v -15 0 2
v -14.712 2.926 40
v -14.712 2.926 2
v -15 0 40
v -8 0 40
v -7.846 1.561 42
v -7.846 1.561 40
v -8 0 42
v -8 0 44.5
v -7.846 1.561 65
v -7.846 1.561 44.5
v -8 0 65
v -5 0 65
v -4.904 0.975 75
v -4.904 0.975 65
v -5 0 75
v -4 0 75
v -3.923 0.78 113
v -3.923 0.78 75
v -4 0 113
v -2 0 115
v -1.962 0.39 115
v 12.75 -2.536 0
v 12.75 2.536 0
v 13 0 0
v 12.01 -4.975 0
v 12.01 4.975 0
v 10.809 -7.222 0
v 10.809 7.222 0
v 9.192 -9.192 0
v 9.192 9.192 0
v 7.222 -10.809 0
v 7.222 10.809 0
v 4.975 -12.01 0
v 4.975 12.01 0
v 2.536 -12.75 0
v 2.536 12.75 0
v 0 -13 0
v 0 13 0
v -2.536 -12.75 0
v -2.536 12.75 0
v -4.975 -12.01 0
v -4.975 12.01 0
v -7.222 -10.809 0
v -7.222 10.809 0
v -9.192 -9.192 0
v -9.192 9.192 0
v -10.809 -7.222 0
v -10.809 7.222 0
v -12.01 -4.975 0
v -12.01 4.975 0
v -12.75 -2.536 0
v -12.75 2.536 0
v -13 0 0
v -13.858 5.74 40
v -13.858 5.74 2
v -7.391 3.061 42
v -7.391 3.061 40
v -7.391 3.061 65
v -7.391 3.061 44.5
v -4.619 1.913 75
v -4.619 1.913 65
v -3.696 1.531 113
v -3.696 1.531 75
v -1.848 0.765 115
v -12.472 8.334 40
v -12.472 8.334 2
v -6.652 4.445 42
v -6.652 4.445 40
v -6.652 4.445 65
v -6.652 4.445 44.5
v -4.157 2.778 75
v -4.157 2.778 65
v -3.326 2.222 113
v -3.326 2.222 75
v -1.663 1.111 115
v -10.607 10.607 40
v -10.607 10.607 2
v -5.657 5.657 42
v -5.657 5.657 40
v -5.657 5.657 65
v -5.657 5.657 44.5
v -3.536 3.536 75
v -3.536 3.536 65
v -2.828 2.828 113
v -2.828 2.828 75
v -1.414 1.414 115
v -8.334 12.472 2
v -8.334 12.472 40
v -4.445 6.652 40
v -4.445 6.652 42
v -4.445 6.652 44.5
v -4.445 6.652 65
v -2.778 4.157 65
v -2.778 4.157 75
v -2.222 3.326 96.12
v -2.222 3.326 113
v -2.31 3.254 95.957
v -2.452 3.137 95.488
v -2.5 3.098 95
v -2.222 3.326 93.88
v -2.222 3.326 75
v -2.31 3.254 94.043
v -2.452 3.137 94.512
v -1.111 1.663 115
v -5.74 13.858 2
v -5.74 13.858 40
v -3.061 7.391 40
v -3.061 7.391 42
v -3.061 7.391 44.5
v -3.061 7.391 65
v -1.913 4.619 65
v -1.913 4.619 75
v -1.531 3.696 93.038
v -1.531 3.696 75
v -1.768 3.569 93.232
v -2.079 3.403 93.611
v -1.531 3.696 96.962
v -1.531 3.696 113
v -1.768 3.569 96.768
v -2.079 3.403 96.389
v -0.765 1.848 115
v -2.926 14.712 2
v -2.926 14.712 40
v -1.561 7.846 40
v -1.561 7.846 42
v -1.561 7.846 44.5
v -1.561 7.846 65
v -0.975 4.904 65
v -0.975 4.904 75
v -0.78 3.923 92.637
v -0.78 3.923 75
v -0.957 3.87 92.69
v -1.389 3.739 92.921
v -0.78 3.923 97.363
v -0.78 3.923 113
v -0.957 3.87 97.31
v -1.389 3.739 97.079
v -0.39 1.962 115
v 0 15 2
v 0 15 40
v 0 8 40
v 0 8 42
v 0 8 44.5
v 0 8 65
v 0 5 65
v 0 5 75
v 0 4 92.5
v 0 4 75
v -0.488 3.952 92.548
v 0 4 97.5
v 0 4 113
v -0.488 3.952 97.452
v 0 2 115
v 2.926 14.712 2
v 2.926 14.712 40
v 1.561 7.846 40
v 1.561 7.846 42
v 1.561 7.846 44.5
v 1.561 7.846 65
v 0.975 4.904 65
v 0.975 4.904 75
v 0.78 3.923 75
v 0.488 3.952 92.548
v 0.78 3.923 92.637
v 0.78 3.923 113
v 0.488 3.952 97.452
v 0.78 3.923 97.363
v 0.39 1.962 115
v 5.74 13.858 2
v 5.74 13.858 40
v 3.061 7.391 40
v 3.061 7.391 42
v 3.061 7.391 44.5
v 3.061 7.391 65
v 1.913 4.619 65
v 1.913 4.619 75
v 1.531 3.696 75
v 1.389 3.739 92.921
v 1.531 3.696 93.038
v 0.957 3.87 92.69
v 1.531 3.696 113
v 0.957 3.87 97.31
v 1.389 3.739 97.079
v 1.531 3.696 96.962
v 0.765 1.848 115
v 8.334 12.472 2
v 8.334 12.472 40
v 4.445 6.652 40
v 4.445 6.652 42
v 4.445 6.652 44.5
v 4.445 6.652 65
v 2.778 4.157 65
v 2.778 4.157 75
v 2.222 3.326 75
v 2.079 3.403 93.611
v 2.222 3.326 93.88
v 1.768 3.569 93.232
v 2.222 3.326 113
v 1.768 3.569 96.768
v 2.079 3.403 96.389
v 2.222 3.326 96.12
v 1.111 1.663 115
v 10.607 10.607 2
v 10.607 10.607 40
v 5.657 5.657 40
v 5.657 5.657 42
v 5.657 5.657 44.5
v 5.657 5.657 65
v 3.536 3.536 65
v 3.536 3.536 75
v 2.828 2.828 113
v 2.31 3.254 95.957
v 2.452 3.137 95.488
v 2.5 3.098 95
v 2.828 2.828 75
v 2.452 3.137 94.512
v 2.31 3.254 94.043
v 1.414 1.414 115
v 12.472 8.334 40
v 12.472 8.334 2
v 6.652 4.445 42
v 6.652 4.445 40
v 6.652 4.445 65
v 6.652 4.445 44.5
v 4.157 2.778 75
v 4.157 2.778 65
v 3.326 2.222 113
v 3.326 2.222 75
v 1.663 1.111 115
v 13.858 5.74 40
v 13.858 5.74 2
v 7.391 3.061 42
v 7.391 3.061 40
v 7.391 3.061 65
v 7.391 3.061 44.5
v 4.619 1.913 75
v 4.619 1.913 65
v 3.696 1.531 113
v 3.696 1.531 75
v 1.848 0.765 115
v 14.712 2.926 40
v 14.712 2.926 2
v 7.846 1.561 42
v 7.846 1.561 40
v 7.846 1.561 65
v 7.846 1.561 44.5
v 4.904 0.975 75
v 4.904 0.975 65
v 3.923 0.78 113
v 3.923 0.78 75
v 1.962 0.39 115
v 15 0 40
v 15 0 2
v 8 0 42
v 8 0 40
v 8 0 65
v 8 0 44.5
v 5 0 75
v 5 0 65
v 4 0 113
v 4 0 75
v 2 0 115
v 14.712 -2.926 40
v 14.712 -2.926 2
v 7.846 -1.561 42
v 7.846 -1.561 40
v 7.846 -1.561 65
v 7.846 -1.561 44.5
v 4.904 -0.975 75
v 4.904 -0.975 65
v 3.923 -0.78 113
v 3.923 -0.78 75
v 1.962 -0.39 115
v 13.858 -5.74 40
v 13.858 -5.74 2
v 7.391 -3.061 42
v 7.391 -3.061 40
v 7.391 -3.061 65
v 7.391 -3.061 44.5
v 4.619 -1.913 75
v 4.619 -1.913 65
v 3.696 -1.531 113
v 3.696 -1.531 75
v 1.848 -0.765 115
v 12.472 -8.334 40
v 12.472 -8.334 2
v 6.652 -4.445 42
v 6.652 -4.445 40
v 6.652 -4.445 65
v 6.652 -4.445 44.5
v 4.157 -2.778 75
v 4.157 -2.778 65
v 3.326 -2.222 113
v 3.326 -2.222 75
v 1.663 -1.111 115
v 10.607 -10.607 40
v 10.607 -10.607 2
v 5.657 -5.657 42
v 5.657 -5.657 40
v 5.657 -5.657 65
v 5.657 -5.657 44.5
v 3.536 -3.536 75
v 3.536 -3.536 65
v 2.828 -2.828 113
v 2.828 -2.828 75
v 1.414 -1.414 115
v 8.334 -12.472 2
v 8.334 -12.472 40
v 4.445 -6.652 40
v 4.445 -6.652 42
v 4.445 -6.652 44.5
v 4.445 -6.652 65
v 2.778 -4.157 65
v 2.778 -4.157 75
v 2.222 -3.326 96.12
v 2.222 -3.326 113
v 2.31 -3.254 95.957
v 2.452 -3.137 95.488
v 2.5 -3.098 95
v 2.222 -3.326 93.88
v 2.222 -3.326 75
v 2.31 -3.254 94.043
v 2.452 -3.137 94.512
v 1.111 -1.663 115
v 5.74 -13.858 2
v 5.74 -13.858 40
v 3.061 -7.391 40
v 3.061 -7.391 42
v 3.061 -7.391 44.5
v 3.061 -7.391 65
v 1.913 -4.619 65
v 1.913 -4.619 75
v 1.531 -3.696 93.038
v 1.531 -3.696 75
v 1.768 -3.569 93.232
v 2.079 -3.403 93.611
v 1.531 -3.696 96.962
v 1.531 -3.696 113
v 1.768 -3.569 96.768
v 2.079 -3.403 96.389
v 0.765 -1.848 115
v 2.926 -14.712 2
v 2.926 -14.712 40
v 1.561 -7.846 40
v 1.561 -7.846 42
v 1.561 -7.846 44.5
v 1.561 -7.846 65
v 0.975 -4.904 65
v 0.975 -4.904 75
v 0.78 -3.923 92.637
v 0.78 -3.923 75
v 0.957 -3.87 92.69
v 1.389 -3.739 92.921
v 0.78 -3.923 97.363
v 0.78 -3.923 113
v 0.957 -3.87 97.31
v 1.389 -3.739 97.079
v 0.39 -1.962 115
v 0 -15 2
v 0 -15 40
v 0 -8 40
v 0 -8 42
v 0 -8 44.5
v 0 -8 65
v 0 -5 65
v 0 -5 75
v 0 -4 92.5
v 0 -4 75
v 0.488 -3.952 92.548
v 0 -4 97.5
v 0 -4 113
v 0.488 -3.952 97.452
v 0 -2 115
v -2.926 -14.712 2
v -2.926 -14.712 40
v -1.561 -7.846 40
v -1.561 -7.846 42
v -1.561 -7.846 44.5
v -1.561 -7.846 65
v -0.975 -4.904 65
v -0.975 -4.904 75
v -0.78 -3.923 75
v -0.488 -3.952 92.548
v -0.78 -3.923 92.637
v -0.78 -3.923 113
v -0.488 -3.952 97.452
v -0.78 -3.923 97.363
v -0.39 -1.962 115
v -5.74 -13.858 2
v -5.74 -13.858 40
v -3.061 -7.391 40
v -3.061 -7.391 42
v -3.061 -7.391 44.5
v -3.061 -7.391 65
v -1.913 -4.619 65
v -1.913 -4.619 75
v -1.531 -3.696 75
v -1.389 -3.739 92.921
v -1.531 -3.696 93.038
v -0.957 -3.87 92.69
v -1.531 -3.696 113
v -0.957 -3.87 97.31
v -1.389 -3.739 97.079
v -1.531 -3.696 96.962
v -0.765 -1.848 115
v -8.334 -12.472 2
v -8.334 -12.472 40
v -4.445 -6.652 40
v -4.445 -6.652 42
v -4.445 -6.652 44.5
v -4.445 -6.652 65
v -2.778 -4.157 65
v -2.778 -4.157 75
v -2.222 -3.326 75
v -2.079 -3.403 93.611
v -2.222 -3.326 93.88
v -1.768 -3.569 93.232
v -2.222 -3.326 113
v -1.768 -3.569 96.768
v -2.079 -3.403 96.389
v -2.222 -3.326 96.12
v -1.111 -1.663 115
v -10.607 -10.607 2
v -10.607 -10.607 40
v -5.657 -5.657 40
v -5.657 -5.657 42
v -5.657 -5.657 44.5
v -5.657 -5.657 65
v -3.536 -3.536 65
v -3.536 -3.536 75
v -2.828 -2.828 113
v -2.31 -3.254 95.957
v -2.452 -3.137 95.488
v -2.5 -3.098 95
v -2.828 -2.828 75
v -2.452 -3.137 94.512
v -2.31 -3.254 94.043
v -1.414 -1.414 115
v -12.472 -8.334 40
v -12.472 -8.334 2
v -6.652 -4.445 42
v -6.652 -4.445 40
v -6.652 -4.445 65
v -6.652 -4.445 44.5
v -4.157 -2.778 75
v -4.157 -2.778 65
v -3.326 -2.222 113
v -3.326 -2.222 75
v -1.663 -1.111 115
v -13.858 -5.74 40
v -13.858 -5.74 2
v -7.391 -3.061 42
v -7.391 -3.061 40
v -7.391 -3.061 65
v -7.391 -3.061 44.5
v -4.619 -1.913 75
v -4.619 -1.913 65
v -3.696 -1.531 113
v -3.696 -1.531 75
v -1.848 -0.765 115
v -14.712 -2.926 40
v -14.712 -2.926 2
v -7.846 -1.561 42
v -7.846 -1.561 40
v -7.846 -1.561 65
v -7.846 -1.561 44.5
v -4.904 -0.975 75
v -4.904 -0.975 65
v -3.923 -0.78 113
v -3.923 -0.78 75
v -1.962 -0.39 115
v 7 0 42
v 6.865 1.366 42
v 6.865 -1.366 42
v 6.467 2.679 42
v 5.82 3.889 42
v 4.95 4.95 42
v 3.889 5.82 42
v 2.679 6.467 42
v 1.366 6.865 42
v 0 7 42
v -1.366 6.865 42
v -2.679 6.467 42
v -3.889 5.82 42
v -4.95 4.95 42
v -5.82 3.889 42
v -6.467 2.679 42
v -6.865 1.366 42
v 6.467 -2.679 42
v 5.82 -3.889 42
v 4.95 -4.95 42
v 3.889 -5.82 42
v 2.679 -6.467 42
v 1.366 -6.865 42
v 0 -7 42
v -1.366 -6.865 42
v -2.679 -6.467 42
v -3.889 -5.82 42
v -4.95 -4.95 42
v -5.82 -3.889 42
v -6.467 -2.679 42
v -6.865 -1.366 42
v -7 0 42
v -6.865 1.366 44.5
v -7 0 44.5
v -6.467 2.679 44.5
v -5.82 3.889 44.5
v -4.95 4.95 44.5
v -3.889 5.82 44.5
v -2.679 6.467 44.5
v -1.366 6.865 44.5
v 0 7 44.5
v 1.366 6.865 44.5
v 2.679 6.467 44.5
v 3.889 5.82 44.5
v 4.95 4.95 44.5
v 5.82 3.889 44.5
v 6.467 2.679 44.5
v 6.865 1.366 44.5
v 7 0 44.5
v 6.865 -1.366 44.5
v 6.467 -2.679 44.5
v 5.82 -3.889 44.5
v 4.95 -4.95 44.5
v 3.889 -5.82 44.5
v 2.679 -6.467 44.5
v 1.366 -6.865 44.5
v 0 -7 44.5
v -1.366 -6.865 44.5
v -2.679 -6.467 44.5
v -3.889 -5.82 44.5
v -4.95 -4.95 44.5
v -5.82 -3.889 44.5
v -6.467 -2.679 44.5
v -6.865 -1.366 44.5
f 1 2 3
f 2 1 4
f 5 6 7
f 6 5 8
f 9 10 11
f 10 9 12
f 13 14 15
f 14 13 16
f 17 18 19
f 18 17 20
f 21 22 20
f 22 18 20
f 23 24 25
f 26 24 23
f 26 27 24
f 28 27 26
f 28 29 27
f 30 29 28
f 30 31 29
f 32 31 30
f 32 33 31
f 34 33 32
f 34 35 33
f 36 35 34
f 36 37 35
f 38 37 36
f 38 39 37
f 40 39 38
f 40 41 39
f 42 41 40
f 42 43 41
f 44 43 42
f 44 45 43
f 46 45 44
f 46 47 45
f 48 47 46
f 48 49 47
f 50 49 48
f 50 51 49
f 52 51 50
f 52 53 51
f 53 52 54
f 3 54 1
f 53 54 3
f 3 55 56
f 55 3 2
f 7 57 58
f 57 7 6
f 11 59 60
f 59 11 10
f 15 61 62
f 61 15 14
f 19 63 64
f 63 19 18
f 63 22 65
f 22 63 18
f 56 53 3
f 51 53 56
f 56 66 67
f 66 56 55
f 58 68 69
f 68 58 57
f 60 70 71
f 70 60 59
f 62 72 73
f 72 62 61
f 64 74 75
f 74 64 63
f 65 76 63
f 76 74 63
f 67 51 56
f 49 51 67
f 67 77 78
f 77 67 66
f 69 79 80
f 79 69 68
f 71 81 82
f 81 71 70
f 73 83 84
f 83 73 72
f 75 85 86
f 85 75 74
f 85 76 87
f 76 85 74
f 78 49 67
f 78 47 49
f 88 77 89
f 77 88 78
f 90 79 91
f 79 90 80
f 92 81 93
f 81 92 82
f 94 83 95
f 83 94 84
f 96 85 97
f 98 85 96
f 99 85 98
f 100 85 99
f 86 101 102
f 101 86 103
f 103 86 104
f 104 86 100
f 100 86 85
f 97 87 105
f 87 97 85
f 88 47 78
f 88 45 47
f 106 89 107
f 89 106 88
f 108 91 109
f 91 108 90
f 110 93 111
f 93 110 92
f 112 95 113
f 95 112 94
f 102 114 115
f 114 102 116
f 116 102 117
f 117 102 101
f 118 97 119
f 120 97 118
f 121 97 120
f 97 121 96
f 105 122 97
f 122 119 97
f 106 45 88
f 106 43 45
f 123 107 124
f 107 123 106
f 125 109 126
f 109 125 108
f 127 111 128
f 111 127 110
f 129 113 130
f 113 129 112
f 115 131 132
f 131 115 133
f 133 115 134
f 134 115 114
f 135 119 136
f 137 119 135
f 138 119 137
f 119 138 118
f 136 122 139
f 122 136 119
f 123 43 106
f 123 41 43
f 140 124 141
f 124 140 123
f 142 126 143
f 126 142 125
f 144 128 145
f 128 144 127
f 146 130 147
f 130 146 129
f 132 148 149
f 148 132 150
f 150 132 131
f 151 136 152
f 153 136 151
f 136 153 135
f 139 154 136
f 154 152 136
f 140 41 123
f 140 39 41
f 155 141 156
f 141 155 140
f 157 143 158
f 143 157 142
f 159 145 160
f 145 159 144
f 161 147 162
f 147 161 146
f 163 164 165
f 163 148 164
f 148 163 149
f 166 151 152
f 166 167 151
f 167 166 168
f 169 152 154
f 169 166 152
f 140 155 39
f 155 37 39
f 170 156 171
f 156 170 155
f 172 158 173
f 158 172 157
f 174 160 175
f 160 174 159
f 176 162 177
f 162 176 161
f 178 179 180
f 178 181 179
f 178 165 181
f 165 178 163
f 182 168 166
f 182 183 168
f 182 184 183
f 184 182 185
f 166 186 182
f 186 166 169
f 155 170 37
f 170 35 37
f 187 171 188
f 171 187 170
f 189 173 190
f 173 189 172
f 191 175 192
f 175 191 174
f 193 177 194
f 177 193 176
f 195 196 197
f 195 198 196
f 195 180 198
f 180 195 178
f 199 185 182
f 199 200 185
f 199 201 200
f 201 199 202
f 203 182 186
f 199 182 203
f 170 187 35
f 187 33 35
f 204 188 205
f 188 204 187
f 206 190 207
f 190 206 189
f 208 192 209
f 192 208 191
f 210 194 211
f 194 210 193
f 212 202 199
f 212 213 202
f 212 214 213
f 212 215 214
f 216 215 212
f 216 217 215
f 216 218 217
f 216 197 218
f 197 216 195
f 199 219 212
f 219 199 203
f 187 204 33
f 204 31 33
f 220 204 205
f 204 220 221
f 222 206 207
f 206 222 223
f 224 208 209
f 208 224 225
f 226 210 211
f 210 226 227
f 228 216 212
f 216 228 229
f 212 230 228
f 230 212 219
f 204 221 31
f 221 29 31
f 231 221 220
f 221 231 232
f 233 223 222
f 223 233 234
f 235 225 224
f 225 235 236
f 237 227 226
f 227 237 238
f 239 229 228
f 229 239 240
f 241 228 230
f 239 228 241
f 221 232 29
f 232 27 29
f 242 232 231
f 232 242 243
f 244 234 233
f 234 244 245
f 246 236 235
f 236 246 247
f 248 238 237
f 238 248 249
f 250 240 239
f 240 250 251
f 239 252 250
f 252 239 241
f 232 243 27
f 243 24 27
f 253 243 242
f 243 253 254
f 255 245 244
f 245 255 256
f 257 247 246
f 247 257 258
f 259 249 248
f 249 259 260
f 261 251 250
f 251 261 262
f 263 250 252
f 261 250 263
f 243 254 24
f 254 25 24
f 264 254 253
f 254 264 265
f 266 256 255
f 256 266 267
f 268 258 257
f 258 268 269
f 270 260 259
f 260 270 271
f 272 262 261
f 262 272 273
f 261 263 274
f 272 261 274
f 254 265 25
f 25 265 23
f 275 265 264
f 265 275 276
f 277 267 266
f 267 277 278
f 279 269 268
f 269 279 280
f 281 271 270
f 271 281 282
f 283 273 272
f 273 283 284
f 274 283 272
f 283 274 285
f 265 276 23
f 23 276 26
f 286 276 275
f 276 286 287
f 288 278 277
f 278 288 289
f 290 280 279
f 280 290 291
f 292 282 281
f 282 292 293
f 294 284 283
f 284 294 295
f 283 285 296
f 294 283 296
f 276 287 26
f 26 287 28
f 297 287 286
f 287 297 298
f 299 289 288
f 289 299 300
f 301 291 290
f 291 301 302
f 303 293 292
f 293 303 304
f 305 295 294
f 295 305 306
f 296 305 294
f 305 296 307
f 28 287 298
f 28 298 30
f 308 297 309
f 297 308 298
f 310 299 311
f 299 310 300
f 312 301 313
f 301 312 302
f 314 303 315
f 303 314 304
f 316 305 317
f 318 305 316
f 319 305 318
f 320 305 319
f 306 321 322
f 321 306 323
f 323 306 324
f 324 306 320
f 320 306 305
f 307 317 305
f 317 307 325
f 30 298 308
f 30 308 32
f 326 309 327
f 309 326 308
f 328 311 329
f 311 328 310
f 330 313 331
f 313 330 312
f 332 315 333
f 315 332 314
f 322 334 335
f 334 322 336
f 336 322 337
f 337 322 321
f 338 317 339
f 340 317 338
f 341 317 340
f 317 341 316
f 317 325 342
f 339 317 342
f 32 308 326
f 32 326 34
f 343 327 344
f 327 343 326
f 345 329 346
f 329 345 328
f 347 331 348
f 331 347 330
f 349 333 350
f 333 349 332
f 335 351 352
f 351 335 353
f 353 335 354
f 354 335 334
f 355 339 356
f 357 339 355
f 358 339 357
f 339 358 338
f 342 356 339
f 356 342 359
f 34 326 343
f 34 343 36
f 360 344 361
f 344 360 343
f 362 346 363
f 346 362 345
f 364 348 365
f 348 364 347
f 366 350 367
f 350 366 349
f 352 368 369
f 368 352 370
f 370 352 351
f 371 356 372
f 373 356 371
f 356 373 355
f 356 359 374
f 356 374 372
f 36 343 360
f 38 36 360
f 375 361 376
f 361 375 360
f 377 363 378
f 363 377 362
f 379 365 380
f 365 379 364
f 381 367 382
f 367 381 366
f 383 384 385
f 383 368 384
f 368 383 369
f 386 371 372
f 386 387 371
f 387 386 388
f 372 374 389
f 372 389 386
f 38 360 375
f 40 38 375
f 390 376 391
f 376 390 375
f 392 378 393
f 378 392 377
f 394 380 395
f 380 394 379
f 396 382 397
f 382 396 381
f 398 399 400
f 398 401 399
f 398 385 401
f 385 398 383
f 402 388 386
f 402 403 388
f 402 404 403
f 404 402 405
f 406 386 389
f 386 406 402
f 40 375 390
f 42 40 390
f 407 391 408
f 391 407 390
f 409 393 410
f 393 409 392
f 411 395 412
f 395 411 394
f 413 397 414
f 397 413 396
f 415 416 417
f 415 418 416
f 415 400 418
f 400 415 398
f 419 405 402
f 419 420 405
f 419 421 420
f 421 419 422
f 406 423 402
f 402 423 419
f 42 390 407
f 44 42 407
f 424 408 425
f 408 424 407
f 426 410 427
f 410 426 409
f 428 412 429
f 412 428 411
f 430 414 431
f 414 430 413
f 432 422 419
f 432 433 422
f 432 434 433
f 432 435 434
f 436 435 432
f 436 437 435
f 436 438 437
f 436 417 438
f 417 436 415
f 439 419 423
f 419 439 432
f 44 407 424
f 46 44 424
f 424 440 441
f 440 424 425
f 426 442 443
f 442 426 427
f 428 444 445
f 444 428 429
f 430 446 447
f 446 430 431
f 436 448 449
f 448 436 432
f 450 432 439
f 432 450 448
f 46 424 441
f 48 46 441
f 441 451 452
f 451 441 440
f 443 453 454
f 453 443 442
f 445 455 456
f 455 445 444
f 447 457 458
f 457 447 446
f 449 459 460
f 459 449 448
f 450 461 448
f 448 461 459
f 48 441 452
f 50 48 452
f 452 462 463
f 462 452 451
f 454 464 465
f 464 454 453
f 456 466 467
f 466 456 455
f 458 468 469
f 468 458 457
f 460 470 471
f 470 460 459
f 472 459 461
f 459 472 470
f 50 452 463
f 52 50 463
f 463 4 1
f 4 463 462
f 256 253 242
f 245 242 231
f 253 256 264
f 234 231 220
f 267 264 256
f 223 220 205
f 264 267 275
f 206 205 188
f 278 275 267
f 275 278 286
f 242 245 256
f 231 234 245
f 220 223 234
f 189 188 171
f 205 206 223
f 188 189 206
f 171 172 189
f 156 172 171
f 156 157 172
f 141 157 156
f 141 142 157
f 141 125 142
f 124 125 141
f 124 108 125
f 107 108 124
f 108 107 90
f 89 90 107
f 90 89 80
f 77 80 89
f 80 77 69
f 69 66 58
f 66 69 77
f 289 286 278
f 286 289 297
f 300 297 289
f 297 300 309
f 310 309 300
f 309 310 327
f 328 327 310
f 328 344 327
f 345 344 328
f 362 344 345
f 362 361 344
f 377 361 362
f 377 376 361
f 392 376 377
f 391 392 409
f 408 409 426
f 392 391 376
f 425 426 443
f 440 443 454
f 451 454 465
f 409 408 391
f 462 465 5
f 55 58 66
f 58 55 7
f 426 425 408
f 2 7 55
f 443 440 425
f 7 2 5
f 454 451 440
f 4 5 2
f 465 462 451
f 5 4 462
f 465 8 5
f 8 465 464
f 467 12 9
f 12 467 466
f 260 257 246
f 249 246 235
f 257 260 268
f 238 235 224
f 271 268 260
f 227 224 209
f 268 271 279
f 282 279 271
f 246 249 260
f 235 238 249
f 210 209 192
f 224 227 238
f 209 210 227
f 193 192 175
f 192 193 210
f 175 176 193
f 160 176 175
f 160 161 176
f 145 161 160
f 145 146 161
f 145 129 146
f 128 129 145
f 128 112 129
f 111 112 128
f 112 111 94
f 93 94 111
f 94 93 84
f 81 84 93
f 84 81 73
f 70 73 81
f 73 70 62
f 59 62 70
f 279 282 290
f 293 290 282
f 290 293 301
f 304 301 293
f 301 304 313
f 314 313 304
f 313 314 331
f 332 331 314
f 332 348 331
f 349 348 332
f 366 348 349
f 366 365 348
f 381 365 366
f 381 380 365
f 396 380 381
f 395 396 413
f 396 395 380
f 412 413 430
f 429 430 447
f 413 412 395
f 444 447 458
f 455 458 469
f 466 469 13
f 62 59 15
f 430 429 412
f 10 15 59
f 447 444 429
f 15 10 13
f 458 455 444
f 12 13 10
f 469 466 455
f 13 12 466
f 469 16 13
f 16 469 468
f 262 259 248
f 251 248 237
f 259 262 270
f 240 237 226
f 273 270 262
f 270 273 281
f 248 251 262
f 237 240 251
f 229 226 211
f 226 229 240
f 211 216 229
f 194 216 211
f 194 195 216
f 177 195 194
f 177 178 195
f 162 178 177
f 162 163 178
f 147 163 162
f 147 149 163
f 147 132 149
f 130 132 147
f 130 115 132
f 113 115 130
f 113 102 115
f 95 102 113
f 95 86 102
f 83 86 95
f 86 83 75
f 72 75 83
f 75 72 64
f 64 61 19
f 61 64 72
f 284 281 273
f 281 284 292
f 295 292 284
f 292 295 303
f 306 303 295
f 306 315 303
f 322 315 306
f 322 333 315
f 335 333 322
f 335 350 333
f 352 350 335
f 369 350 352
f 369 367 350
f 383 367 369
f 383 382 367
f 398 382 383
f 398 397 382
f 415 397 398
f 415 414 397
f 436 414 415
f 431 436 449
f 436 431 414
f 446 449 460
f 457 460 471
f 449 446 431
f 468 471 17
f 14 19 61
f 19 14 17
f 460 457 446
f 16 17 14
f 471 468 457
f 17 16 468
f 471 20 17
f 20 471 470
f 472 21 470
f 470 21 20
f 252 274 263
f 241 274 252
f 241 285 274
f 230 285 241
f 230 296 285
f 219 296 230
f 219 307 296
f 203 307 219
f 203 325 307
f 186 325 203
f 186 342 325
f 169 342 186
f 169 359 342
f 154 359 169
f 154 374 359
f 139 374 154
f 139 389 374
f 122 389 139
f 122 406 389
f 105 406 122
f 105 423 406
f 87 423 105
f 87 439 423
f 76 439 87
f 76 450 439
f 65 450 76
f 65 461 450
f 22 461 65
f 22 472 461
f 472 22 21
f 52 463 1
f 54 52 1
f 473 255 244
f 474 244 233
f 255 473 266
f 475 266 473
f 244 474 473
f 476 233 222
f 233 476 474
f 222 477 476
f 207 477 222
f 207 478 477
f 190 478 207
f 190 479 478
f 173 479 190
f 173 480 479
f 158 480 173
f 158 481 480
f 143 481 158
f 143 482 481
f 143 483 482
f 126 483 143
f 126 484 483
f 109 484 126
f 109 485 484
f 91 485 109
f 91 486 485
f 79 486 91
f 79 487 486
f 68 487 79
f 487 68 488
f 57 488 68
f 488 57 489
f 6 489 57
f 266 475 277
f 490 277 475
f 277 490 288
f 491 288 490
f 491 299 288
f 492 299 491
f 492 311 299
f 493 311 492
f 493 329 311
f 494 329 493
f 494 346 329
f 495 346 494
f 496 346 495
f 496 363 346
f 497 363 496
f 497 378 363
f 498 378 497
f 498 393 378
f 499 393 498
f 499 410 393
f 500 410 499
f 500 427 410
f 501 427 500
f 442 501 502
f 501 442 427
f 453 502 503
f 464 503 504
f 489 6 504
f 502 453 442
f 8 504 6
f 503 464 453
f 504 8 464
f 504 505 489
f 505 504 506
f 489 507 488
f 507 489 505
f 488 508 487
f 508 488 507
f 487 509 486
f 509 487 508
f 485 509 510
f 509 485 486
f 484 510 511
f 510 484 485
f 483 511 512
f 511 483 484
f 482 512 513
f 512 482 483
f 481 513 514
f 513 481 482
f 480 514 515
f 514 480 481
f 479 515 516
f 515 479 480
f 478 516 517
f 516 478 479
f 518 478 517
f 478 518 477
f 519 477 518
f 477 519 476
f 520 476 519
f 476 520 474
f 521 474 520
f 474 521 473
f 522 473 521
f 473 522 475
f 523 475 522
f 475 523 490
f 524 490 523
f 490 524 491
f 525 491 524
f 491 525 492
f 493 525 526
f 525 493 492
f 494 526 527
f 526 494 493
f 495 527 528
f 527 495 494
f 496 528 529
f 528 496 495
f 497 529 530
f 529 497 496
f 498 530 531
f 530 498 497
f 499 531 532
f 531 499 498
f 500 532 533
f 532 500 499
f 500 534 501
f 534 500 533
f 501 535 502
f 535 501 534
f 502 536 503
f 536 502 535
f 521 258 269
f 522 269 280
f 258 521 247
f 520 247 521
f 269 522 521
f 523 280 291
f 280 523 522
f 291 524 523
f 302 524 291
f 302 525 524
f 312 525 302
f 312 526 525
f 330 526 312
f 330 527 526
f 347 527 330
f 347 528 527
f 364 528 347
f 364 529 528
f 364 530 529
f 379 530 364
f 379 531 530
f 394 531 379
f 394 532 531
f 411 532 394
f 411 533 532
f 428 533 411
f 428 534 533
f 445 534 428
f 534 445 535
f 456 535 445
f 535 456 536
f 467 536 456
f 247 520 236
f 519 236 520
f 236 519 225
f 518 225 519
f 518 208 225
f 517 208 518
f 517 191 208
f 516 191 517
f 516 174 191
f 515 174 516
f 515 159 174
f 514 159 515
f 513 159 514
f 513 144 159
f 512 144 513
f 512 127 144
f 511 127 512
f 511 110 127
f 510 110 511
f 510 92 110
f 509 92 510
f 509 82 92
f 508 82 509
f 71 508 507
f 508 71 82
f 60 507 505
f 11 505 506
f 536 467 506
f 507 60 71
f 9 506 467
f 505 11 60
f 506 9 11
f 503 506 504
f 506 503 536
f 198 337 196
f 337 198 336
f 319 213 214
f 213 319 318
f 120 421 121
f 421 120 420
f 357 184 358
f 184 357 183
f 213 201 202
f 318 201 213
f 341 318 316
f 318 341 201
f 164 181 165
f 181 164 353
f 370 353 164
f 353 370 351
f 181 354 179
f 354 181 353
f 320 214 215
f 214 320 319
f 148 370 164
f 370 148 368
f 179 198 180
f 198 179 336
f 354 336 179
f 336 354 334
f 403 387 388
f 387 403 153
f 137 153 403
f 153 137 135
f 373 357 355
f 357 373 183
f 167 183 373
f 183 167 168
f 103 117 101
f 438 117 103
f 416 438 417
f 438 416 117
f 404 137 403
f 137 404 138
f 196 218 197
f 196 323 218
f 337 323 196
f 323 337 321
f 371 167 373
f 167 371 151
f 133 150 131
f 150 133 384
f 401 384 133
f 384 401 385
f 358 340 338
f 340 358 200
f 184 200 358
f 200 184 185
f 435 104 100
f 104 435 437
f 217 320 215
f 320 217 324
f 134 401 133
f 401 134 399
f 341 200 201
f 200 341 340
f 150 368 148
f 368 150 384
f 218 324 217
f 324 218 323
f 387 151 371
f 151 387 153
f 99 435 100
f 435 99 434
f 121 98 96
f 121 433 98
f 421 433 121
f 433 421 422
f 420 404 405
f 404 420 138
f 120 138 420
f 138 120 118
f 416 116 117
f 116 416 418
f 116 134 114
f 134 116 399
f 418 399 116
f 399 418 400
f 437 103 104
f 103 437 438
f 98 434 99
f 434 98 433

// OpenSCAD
$fn = 32;

// ----------------------------------------------------------------------
// Stepped shaft: diameters 30, 16, 10, 8 mm, 115 mm long
// ----------------------------------------------------------------------

// --- parameters (mm) ---
d1 = 30;                  // step 1 diameter
len1 = 40;                // step 1 length
d2 = 16;                  // step 2 diameter
len2 = 25;                // step 2 length
d3 = 10;                  // step 3 diameter
len3 = 10;                // step 3 length
d4 = 8;                   // step 4 diameter
len4 = 40;                // step 4 length
total = 115;              // overall length
chamfer = 2;              // end chamfer
groove_r = 8;             // groove radius
groove_z = 42;            // groove position from the end
groove_w = 2.5;           // groove width
groove_d = 1;             // groove depth
cross_d = 5;              // cross pin hole
cross_z = 95;             // cross hole position

/* closed turning profile: x is the radius, y is the length */
profile = [[0, 0], [15 - chamfer, 0], [15, chamfer], [15, 40], [8, 40], [8, 65], [5, 65], [5, 75], [4, 75], [4, 113], [2, 115], [0, 115]];

difference() {
  rotate_extrude() polygon(profile);
  /* circlip groove just behind the shoulder */
  rotate_extrude() translate([groove_r - groove_d, groove_z]) square([groove_d + 1, groove_w]);
  /* cross pin hole through the small step */
  translate([0, 0, cross_z]) rotate([90, 0, 0]) cylinder(h = d4 + 4, d = cross_d, center = true);
}
